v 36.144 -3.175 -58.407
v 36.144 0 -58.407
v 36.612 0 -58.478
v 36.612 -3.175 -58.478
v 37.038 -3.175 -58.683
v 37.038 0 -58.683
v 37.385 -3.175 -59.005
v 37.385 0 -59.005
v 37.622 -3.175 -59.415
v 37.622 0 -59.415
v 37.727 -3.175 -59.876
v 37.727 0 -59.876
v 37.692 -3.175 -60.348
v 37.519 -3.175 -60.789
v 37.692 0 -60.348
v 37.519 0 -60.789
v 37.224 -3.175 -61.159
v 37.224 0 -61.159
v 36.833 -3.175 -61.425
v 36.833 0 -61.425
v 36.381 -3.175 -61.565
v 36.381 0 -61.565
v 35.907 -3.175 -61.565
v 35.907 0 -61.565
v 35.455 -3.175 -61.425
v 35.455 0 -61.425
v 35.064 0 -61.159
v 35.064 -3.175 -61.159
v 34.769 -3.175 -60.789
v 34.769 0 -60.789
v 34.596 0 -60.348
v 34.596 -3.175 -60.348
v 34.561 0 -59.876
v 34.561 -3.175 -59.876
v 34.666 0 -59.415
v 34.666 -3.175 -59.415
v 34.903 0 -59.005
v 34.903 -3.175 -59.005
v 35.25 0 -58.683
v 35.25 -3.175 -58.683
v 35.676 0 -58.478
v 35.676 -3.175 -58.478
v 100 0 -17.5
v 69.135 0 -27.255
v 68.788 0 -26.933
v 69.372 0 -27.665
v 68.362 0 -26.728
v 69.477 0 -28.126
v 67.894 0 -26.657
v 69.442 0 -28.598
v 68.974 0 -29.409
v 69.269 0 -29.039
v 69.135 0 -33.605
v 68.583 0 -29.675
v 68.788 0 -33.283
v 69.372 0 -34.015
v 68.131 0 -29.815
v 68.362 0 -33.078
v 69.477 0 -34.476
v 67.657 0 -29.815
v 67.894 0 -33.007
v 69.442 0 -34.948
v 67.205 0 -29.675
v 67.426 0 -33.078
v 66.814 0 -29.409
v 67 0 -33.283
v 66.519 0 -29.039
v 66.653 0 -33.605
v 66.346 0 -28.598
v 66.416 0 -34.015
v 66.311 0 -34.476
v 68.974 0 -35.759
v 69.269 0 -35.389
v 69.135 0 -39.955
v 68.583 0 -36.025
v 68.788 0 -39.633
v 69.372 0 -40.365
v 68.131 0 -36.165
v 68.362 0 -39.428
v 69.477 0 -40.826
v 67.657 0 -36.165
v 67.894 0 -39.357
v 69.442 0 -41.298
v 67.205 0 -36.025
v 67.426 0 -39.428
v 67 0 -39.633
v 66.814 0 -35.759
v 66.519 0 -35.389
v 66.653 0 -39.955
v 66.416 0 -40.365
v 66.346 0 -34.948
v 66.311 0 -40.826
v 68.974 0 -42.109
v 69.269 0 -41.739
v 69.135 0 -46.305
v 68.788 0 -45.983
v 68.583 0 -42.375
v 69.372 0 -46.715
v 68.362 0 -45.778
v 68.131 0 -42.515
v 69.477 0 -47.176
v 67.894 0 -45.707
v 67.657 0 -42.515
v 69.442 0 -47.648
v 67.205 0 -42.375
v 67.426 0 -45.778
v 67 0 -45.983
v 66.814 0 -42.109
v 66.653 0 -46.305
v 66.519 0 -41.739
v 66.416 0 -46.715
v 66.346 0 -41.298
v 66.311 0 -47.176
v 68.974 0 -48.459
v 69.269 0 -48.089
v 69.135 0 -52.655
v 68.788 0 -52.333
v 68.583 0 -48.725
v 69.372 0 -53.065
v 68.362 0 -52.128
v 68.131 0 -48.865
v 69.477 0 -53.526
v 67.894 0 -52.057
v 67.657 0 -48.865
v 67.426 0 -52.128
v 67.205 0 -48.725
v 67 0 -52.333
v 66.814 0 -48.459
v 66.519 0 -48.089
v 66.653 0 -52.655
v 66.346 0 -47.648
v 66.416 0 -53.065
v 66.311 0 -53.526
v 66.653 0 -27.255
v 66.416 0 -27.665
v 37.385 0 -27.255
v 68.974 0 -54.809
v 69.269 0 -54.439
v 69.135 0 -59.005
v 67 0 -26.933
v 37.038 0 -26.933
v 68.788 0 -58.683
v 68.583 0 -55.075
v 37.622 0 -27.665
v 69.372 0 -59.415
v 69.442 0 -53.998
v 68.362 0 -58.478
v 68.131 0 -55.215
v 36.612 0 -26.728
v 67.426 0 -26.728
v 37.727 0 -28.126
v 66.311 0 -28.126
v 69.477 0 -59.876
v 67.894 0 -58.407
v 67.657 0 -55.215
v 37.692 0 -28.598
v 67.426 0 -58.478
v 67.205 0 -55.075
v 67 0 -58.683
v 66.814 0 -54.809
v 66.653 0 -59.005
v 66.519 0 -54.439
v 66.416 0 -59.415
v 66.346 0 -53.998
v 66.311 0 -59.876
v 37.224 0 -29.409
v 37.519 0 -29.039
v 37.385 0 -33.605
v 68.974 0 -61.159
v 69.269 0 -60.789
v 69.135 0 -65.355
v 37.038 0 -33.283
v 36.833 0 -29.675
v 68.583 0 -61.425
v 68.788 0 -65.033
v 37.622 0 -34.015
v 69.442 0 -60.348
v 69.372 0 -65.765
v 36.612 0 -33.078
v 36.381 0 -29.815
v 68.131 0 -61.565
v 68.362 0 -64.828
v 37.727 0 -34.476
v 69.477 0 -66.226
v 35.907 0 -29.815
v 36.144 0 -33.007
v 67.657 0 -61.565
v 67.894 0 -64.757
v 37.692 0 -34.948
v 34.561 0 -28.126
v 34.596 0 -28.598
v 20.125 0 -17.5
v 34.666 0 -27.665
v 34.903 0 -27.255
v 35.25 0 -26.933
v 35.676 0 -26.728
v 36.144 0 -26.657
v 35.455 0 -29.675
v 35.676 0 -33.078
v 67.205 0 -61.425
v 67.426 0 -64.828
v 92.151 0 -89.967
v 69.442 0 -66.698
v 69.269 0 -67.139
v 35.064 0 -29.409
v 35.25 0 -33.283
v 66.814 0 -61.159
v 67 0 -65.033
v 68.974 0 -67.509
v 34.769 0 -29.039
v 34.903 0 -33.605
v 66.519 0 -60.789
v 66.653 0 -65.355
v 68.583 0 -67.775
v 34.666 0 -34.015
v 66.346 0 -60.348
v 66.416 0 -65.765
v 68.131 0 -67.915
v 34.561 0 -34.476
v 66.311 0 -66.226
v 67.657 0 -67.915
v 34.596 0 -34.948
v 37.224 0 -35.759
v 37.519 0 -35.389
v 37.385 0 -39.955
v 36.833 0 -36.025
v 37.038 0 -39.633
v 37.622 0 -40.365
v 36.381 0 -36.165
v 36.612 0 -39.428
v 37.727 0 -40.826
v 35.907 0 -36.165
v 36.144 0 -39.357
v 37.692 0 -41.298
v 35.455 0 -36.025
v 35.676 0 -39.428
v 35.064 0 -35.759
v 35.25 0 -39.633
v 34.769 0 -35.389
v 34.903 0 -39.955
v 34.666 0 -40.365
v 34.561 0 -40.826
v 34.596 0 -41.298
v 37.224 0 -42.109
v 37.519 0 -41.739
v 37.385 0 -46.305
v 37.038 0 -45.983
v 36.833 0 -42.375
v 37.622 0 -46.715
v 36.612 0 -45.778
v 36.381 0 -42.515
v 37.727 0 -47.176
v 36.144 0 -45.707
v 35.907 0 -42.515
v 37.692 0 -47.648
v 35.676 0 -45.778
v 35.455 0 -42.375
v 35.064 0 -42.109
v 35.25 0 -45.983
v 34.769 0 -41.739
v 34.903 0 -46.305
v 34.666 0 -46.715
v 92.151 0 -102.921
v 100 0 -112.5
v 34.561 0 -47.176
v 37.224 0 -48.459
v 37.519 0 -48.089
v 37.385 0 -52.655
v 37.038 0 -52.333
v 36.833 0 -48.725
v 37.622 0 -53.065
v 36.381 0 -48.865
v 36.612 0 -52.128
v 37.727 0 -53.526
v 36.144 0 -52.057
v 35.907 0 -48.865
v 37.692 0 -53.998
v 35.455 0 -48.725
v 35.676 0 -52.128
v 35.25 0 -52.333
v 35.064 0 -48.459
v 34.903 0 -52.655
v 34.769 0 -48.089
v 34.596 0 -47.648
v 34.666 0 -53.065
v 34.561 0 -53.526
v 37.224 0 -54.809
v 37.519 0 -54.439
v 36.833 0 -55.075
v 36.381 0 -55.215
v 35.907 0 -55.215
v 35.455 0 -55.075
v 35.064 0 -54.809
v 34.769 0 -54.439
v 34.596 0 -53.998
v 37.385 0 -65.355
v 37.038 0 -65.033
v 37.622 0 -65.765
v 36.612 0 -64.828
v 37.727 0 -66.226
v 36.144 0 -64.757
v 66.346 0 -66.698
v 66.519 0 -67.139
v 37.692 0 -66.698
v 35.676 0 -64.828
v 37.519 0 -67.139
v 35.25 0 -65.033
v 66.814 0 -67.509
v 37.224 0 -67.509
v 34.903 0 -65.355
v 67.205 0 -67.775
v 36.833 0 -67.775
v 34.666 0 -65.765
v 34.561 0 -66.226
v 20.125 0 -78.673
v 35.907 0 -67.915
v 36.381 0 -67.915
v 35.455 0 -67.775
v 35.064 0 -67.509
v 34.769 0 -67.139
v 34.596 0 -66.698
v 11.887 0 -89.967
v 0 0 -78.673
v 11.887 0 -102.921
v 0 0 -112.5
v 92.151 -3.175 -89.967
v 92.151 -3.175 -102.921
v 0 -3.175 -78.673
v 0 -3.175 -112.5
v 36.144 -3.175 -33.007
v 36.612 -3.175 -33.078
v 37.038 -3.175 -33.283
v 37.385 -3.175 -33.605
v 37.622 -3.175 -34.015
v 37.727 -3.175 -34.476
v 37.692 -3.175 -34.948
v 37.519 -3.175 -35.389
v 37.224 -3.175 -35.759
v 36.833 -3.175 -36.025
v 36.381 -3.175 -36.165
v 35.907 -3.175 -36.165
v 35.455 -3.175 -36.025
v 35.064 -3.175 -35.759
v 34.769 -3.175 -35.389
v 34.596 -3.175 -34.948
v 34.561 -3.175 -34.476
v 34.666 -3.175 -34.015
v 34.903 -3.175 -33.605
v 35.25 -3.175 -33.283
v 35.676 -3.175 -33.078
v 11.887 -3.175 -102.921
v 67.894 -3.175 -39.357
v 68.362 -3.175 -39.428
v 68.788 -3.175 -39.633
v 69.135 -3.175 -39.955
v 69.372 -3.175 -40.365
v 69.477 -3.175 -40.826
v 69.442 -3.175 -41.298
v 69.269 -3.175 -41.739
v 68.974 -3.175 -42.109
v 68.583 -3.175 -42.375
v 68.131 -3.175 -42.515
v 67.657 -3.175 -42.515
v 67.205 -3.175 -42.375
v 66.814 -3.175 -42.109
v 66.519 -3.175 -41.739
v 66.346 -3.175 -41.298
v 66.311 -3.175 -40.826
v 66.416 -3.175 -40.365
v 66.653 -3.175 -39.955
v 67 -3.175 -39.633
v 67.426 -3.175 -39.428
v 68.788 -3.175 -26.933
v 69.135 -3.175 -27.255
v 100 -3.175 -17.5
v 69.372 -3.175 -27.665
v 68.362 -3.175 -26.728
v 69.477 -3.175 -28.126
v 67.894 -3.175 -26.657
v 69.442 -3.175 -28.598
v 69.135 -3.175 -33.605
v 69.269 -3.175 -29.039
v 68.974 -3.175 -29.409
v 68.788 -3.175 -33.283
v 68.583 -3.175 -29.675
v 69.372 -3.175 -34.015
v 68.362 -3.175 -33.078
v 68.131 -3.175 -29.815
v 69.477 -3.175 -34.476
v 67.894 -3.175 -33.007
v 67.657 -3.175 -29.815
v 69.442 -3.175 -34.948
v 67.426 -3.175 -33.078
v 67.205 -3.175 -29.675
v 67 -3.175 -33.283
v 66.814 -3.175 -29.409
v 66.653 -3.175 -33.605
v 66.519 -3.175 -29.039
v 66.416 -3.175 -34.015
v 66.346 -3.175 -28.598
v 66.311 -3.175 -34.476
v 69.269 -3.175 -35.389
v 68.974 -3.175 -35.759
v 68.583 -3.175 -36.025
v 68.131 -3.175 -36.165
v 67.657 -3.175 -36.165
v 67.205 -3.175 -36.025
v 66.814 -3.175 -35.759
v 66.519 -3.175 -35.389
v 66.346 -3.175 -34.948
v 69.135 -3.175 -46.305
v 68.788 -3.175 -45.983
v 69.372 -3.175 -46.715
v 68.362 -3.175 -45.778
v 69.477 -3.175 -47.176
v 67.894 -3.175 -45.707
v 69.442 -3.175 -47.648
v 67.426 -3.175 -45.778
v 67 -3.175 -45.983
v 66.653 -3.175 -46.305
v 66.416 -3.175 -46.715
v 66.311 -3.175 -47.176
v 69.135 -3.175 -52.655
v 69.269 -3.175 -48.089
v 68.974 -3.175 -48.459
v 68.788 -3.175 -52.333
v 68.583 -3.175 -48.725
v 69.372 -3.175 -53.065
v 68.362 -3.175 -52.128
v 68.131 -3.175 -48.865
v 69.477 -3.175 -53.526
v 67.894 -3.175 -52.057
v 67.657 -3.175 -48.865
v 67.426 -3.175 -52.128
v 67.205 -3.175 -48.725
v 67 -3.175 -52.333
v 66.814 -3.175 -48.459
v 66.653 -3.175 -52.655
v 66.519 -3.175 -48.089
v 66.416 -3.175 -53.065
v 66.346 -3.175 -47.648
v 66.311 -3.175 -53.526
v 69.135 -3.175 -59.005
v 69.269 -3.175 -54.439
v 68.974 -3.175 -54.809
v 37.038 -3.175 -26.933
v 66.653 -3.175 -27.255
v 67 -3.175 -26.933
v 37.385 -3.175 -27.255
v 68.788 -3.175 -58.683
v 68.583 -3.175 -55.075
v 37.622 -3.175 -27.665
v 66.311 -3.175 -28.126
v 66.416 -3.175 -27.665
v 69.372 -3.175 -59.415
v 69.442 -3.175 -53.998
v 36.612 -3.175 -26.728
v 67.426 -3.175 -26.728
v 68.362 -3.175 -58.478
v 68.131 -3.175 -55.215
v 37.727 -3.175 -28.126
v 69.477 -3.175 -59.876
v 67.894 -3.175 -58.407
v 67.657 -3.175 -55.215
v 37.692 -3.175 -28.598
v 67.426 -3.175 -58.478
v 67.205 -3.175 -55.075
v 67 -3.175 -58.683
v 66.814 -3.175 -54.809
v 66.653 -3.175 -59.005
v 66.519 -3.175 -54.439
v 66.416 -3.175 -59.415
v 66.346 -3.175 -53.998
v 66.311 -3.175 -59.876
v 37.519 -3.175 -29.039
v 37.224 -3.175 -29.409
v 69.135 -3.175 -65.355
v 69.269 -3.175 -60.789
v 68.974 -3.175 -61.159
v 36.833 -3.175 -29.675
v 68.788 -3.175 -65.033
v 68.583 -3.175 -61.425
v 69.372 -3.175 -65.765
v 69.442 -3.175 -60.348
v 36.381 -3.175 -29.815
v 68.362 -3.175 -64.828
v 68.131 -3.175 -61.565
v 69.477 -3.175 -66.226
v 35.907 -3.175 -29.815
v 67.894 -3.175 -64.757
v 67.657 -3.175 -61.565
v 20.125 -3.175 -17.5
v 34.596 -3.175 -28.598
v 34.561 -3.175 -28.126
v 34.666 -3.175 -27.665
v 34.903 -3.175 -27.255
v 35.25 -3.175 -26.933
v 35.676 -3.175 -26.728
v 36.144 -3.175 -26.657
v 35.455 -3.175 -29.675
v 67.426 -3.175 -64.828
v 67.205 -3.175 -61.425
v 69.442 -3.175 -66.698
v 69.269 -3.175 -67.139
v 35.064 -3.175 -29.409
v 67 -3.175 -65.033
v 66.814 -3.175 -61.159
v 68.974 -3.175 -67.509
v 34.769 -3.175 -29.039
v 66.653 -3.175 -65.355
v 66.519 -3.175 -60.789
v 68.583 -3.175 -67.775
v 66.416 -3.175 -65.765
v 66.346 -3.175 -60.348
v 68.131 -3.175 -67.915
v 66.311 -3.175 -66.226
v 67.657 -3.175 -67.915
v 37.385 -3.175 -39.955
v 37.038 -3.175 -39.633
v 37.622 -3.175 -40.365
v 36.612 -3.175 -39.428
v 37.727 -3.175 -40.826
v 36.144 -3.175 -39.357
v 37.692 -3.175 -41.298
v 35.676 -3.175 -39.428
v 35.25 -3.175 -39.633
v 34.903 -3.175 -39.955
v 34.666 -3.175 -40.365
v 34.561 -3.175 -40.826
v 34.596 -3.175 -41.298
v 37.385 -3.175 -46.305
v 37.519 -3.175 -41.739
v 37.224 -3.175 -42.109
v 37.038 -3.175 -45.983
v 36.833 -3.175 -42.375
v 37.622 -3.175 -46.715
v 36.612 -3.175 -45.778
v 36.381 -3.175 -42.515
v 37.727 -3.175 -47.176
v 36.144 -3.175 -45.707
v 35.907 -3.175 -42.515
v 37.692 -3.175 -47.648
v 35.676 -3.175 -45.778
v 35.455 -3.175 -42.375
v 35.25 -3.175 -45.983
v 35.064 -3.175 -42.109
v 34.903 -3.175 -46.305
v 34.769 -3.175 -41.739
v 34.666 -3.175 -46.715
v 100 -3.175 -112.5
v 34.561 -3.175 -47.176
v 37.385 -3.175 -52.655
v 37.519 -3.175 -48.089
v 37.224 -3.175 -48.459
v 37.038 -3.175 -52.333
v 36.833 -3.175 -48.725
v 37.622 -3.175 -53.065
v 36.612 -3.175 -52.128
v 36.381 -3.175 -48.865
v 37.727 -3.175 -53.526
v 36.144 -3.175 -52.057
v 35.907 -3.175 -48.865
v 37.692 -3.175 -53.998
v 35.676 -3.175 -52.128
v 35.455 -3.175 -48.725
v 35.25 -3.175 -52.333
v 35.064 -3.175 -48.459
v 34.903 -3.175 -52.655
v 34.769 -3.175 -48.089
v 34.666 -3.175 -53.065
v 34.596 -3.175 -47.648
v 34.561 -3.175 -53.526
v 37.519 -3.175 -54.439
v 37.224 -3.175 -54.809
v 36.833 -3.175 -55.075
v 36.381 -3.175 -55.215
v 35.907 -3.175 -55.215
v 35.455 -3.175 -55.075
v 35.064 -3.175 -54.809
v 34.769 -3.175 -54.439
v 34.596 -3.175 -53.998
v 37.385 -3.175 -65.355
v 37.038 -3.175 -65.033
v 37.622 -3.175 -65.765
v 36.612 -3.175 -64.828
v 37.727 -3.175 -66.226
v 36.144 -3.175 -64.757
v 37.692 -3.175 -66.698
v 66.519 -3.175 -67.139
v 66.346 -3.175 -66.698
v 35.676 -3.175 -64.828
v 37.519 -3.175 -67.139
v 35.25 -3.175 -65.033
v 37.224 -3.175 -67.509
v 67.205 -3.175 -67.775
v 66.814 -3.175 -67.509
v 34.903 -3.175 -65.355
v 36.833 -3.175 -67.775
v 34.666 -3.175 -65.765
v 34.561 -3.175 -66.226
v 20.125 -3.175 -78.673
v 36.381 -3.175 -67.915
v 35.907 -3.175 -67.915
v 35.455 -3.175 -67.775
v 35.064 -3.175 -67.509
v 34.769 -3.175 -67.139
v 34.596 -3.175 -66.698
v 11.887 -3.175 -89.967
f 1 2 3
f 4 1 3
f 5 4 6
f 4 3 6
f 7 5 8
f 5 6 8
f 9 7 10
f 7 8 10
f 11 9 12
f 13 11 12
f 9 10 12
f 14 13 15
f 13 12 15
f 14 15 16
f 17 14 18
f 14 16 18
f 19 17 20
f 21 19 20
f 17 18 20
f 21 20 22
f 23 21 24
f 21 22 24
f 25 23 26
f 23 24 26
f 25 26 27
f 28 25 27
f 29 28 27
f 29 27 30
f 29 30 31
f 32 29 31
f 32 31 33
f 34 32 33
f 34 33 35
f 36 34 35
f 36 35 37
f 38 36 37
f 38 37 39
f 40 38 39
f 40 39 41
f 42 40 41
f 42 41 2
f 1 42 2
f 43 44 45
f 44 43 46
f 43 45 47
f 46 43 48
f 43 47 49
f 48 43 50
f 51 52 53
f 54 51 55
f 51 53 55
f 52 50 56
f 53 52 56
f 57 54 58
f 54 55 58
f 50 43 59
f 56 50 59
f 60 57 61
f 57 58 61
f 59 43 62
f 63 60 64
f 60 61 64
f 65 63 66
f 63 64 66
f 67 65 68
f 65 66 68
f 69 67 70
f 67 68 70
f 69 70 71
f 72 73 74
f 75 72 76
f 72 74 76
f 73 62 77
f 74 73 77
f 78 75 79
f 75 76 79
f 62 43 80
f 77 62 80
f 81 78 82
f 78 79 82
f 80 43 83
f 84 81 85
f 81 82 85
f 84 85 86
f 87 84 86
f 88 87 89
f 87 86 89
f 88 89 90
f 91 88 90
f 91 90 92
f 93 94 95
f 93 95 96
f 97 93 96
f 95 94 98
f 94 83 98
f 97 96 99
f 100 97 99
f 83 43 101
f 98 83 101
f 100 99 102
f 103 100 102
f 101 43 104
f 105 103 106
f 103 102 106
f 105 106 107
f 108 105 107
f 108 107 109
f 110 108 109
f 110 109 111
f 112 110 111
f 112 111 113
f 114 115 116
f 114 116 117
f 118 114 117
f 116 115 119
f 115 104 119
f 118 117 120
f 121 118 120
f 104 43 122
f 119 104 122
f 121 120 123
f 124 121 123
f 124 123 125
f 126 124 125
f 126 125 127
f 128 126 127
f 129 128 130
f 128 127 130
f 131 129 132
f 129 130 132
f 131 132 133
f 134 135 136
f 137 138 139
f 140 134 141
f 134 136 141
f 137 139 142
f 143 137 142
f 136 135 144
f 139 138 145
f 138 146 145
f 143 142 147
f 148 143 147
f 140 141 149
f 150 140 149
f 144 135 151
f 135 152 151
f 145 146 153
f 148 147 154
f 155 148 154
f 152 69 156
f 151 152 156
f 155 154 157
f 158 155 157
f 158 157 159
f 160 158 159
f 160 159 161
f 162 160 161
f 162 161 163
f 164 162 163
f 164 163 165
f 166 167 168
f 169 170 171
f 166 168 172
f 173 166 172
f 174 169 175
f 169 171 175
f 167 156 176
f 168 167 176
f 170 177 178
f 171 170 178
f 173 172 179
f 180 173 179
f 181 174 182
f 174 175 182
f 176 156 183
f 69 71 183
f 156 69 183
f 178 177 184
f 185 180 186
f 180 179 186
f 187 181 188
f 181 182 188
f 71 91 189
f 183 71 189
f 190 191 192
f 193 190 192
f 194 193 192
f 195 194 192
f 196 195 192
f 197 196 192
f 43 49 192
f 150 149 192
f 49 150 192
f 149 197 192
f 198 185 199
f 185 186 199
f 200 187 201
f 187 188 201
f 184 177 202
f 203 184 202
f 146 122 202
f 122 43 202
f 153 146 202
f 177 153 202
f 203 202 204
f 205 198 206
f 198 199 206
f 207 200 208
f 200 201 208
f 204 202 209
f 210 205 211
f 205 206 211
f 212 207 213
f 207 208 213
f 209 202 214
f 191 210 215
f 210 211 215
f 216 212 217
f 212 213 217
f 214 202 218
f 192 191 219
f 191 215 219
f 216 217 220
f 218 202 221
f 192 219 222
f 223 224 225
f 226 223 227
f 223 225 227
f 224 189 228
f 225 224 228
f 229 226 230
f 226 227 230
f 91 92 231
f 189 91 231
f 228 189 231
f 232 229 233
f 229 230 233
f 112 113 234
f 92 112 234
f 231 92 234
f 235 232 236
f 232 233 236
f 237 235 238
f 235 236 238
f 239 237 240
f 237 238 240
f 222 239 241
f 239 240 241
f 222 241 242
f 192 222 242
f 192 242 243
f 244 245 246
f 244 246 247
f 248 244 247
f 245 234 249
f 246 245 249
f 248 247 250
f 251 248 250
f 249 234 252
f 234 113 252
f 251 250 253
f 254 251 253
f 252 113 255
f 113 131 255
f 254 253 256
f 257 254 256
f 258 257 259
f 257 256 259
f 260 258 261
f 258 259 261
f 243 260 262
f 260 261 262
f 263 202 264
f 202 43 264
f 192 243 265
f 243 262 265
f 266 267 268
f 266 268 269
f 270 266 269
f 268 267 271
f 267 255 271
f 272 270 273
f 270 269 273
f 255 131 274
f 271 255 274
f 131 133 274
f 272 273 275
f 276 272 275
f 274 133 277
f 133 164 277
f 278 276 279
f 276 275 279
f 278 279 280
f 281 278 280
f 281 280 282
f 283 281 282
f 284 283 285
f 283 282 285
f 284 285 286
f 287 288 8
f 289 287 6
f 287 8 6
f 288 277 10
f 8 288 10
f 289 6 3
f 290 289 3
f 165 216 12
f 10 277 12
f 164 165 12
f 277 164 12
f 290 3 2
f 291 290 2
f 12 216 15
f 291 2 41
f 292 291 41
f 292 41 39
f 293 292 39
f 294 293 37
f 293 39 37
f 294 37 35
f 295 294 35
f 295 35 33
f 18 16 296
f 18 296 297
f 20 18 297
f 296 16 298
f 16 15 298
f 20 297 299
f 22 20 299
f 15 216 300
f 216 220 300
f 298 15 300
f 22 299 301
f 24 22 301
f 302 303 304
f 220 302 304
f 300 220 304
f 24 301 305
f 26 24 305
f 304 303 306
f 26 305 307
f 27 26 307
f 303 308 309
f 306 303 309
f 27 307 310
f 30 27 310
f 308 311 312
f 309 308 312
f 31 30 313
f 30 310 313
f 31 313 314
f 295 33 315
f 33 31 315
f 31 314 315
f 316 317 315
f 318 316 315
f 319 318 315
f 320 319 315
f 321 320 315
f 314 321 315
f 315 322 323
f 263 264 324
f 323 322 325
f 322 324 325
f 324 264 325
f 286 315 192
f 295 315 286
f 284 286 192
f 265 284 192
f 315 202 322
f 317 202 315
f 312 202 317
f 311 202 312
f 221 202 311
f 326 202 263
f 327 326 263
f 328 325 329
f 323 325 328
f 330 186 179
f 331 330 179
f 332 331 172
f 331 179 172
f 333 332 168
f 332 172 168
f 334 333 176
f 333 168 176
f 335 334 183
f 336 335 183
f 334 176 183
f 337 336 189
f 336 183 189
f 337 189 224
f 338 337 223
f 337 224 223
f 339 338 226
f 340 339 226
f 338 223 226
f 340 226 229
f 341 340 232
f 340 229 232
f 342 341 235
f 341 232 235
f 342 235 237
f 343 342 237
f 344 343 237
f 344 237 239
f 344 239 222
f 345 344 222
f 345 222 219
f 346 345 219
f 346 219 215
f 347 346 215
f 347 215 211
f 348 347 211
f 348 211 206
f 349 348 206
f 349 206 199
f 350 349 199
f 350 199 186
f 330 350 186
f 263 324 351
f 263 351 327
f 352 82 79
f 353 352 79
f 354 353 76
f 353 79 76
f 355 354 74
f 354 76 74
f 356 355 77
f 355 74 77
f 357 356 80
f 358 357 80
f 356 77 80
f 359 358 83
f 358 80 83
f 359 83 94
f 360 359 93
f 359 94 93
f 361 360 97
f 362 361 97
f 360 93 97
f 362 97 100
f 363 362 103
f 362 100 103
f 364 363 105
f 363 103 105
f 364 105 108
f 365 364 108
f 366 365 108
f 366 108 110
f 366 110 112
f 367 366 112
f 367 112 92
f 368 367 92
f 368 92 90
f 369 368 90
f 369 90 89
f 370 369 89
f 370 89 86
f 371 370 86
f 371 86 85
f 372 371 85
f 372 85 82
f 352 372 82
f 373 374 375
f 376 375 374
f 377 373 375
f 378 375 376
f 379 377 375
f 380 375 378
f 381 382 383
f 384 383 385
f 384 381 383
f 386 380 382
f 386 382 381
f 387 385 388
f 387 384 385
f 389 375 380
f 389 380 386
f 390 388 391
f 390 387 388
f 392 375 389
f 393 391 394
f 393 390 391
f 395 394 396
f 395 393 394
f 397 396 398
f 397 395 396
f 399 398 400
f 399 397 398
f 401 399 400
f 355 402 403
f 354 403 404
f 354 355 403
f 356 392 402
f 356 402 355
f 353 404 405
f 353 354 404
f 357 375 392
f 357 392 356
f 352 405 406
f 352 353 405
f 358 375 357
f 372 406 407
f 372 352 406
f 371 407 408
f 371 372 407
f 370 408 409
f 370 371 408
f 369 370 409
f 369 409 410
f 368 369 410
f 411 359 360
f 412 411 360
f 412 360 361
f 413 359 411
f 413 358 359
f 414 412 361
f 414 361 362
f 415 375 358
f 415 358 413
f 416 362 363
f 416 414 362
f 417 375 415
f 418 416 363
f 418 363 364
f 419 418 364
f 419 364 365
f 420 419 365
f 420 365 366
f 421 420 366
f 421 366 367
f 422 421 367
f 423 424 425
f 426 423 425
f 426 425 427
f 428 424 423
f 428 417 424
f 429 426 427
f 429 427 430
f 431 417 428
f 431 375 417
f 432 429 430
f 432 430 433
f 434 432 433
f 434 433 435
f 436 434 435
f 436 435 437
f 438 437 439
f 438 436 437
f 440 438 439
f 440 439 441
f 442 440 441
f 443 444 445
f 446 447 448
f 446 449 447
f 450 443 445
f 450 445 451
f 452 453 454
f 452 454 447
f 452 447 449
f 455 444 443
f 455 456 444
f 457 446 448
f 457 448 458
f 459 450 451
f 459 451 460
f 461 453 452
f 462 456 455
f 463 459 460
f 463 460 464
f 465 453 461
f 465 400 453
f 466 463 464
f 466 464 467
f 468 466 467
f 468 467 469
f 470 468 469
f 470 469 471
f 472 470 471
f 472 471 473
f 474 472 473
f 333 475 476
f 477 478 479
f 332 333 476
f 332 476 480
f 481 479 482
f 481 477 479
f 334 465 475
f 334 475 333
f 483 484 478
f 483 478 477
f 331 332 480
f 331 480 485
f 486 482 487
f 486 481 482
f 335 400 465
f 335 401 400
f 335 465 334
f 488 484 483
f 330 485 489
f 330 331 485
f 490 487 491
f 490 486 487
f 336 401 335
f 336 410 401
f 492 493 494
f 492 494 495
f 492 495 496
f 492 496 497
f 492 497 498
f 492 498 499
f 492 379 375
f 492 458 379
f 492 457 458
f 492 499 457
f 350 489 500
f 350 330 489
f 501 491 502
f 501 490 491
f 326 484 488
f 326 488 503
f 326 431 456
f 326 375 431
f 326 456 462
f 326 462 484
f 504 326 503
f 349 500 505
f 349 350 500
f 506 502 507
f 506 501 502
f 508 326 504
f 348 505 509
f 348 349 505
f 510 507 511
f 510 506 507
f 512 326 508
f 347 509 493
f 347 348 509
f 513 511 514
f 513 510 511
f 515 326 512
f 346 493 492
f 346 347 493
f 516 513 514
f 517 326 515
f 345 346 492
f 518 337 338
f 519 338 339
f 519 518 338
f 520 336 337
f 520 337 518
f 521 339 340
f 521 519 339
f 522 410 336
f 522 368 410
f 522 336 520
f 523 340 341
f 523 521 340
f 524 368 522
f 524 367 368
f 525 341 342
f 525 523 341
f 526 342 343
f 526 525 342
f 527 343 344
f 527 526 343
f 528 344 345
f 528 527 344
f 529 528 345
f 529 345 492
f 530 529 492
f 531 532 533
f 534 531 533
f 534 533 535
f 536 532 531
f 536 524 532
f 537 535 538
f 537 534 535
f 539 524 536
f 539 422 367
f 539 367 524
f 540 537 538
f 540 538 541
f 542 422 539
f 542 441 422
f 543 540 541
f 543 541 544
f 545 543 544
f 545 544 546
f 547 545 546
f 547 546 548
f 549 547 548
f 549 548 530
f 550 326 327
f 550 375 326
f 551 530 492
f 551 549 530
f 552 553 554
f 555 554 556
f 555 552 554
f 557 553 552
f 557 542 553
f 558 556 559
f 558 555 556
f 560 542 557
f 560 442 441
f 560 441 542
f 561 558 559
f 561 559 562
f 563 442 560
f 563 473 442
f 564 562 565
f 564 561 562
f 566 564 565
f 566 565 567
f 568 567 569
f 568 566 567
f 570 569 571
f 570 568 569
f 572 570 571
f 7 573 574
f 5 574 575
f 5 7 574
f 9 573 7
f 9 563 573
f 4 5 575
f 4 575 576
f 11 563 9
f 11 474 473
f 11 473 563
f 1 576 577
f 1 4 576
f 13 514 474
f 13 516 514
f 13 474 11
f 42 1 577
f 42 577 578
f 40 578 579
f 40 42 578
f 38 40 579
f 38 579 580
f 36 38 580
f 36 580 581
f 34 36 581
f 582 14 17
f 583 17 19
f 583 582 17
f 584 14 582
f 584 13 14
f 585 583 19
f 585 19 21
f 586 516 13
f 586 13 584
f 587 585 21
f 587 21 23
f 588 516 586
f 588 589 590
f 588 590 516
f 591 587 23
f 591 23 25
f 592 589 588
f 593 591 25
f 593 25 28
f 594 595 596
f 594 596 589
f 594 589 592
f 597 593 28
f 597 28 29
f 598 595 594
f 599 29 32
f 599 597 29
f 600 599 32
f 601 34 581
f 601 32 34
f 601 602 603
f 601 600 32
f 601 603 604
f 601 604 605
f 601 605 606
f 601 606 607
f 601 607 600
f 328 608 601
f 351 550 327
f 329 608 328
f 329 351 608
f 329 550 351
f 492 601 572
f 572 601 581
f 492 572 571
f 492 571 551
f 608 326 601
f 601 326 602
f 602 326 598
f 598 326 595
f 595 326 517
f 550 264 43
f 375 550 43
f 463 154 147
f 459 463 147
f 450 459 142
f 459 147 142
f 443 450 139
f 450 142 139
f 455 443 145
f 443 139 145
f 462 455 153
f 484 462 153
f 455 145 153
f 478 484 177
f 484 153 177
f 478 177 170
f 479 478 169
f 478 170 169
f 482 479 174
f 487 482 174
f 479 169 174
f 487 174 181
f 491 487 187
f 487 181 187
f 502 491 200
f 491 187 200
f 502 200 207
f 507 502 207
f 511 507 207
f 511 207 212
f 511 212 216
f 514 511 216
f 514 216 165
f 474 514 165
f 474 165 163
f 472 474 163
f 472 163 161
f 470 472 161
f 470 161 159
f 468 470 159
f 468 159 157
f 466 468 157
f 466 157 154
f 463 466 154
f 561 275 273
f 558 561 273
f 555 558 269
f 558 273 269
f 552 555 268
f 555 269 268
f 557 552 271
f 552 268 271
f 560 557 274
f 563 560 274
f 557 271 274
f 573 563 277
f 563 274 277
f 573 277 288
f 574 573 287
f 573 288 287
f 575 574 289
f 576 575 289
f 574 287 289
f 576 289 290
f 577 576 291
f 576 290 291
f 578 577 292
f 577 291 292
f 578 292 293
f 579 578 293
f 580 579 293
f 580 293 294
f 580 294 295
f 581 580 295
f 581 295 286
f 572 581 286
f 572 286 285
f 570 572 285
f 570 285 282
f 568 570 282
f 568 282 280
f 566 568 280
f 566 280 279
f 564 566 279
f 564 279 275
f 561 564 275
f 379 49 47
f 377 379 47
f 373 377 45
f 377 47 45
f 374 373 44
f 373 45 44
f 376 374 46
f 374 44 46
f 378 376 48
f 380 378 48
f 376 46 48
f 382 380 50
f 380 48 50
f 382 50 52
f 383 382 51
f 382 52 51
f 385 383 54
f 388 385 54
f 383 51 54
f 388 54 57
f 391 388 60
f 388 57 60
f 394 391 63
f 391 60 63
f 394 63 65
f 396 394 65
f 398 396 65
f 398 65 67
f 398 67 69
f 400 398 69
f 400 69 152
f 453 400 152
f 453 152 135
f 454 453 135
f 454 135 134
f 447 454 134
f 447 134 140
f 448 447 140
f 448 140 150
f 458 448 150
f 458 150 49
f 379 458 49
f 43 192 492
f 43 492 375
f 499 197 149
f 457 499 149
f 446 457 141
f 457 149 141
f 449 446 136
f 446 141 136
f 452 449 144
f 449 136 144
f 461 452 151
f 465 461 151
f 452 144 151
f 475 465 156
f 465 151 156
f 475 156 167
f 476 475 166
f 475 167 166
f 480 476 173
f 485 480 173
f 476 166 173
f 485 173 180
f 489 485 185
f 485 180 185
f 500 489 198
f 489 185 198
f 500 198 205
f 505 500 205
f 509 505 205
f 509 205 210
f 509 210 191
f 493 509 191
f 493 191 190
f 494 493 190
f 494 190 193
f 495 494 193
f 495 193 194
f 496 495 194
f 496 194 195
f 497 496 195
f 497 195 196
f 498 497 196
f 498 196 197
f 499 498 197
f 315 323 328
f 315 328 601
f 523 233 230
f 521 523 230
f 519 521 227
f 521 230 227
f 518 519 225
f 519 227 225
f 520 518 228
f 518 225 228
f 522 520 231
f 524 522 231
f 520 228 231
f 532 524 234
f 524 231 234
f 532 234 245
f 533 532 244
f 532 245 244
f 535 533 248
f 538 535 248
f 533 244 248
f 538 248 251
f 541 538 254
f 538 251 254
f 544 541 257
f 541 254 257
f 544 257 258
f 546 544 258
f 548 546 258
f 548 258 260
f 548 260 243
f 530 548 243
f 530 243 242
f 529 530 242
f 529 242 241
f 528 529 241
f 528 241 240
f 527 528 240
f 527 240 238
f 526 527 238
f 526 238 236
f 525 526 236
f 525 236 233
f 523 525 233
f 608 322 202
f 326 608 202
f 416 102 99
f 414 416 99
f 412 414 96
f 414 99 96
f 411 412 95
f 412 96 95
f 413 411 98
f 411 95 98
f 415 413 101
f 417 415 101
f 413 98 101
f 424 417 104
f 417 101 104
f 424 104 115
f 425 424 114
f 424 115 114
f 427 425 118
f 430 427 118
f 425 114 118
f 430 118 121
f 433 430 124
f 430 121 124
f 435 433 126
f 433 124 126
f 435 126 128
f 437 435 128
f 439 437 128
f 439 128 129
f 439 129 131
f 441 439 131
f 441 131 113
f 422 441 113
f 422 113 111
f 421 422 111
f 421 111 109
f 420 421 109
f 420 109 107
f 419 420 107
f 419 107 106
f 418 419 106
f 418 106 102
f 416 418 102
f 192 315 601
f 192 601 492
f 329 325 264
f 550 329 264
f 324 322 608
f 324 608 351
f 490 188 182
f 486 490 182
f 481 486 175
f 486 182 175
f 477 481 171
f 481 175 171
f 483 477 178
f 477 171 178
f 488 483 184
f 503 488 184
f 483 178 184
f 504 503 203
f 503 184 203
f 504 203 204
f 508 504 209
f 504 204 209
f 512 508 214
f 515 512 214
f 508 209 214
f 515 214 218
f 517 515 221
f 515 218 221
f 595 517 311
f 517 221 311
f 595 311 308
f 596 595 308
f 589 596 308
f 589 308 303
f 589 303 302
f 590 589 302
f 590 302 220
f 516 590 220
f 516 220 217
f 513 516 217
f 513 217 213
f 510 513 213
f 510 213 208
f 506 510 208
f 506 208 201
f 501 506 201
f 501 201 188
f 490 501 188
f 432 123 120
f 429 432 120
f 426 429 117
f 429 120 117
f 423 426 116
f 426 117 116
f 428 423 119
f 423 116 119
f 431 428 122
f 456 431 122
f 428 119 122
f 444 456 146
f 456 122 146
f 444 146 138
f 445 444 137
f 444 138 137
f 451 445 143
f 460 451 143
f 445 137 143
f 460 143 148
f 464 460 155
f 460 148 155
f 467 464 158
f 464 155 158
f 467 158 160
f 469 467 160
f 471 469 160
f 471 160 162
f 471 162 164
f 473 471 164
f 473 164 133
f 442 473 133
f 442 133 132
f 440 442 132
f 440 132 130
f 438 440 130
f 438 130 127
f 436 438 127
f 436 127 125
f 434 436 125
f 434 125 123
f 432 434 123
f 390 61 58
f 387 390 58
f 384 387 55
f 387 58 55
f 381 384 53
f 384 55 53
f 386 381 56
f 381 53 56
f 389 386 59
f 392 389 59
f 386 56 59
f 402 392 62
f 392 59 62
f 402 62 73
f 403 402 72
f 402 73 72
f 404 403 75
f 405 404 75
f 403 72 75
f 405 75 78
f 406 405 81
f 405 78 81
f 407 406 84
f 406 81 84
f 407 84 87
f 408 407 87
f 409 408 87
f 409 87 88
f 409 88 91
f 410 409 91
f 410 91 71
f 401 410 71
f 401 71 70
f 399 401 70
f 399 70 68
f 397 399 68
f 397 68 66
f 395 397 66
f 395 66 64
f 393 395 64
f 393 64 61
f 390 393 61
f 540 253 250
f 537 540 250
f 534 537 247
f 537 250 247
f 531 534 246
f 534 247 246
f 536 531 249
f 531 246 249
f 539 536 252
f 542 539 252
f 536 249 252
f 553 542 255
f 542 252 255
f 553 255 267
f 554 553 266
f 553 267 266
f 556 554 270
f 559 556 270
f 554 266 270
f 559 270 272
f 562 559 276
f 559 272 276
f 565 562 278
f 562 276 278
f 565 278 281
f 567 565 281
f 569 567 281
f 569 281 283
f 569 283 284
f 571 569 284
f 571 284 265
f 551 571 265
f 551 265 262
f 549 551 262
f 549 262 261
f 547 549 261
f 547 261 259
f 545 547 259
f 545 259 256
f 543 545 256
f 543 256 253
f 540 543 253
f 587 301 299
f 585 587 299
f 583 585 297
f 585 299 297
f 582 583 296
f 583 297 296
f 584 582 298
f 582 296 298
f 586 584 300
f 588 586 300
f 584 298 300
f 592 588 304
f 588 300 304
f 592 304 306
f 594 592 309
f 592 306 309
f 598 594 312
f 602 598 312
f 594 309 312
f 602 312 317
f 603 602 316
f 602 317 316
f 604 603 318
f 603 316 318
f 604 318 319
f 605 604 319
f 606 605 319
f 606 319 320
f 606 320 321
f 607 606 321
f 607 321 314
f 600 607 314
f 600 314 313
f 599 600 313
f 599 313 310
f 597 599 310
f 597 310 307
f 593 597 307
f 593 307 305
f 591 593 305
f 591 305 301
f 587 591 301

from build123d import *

# Parameters (mm, degrees)
BOSS_EXTRUDE1_DEPTH = 3.175
SKETCH2_R           = 1.5875
SKETCH2_W           = 80.264
SKETCH2_H           = 12.954
CUT_EXTRUDE1_DEPTH  = 223.985606318
SKETCH7_R           = 2.032
SKETCH7_R_2         = 1.651
SKETCH7_W           = 47.244
SKETCH7_H           = 139.192
CUT_EXTRUDE4_DEPTH  = 223.985606318
SKETCH8_R           = 1.651
CUT_EXTRUDE5_DEPTH  = 223.985606318
SKETCH9_R           = 1.778
CUT_EXTRUDE6_DEPTH  = 221.482742149
CUT_EXTRUDE7_DEPTH  = 221.482742149


with BuildPart() as part:
    # Sketch1 → Boss-Extrude1 (new body)
    with BuildSketch(Plane(origin=(0, 0, 0), x_dir=(1, 0, 0), z_dir=(0, 1, 0))):
        with BuildLine():
            Line((-80, 112.5), (100, 112.5))
            Line((100, 112.5), (100, -112.5))
            Line((100, -112.5), (-80, -112.5))
            ThreePointArc((-80, -112.5), (-192.5, 0), (-80, 112.5))
        make_face()
    extrude(amount=-BOSS_EXTRUDE1_DEPTH)

    # Sketch2 → Cut-Extrude1 (cut, through all)
    with BuildSketch(Plane(origin=(0, 0, 0), x_dir=(1, 0, 0), z_dir=(0, 1, 0))):
        with Locations(Location((36.144045702, -66.3448, 0), (0, 0, 270))):
            Circle(SKETCH2_R)
        with Locations(Location((36.144045702, -59.9948, 0), (0, 0, 270))):
            Circle(SKETCH2_R)
        with Locations(Location((36.144045702, -53.6448, 0), (0, 0, 270))):
            Circle(SKETCH2_R)
        with Locations(Location((36.144045702, -47.2948, 0), (0, 0, 270))):
            Circle(SKETCH2_R)
        with Locations(Location((36.144045702, -40.9448, 0), (0, 0, 270))):
            Circle(SKETCH2_R)
        with Locations(Location((36.144045702, -34.5948, 0), (0, 0, 270))):
            Circle(SKETCH2_R)
        with Locations(Location((36.144045702, -28.2448, 0), (0, 0, 270))):
            Circle(SKETCH2_R)
        with Locations(Location((67.894045702, -66.3448, 0), (0, 0, 270))):
            Circle(SKETCH2_R)
        with Locations(Location((67.894045702, -59.9948, 0), (0, 0, 270))):
            Circle(SKETCH2_R)
        with Locations(Location((67.894045702, -53.6448, 0), (0, 0, 270))):
            Circle(SKETCH2_R)
        with Locations(Location((67.894045702, -47.2948, 0), (0, 0, 270))):
            Circle(SKETCH2_R)
        with Locations(Location((67.894045702, -40.9448, 0), (0, 0, 270))):
            Circle(SKETCH2_R)
        with Locations(Location((67.894045702, -34.5948, 0), (0, 0, 270))):
            Circle(SKETCH2_R)
        with Locations(Location((67.894045702, -28.2448, 0), (0, 0, 270))):
            Circle(SKETCH2_R)
        with Locations(Location((36.144045702, 66.3448, 0), (0, 0, 270))):
            Circle(SKETCH2_R)
        with Locations(Location((36.144045702, 59.9948, 0), (0, 0, 270))):
            Circle(SKETCH2_R)
        with Locations(Location((36.144045702, 53.6448, 0), (0, 0, 270))):
            Circle(SKETCH2_R)
        with Locations(Location((36.144045702, 47.2948, 0), (0, 0, 270))):
            Circle(SKETCH2_R)
        with Locations(Location((36.144045702, 40.9448, 0), (0, 0, 270))):
            Circle(SKETCH2_R)
        with Locations(Location((36.144045702, 34.5948, 0), (0, 0, 270))):
            Circle(SKETCH2_R)
        with Locations(Location((36.144045702, 28.2448, 0), (0, 0, 270))):
            Circle(SKETCH2_R)
        with Locations(Location((67.894045702, 66.3448, 0), (0, 0, 270))):
            Circle(SKETCH2_R)
        with Locations(Location((67.894045702, 59.9948, 0), (0, 0, 270))):
            Circle(SKETCH2_R)
        with Locations(Location((67.894045702, 53.6448, 0), (0, 0, 270))):
            Circle(SKETCH2_R)
        with Locations(Location((67.894045702, 47.2948, 0), (0, 0, 270))):
            Circle(SKETCH2_R)
        with Locations(Location((67.894045702, 40.9448, 0), (0, 0, 270))):
            Circle(SKETCH2_R)
        with Locations(Location((67.894045702, 34.5948, 0), (0, 0, 270))):
            Circle(SKETCH2_R)
        with Locations(Location((67.894045702, 28.2448, 0), (0, 0, 270))):
            Circle(SKETCH2_R)
        with Locations((52.019045702, -96.4438)):
            Rectangle(SKETCH2_W, SKETCH2_H)
        with Locations((52.019045702, 96.4438)):
            Rectangle(SKETCH2_W, SKETCH2_H)
    extrude(amount=-CUT_EXTRUDE1_DEPTH, mode=Mode.SUBTRACT)

    # Sketch7 → Cut-Extrude4 (cut, through all)
    with BuildSketch(Plane(origin=(0, 0, 0), x_dir=(1, 0, 0), z_dir=(0, 1, 0))):
        with Locations(Location((-50.421540267, 0, 0), (0, 0, 270))):
            Circle(SKETCH7_R)
        with Locations(Location((25.778459733, 0, 0), (0, 0, 270))):
            Circle(SKETCH7_R_2)
        with Locations(Location((86.738459733, 0, 0), (0, 0, 270))):
            Circle(SKETCH7_R_2)
        with Locations(Location((-50.421540267, 40.64, 0), (0, 0, 270))):
            Circle(SKETCH7_R_2)
        with Locations(Location((-50.421540267, -40.64, 0), (0, 0, 270))):
            Circle(SKETCH7_R_2)
        with Locations(Location((15.872459733, -40.64, 0), (0, 0, 270))):
            Circle(SKETCH7_R)
        with Locations(Location((15.872459733, 40.64, 0), (0, 0, 270))):
            Circle(SKETCH7_R)
        with Locations((-14.099540267, 0)):
            Rectangle(SKETCH7_W, SKETCH7_H)
    extrude(amount=-CUT_EXTRUDE4_DEPTH, mode=Mode.SUBTRACT)

    # Sketch8 → Cut-Extrude5 (cut, through all)
    with BuildSketch(Plane(origin=(0, 0, 0), x_dir=(1, 0, 0), z_dir=(0, 1, 0))):
        with Locations(Location((-177.3836, 33.02, 0), (0, 0, 270))):
            Circle(SKETCH8_R)
        with Locations(Location((-177.3836, -33.02, 0), (0, 0, 270))):
            Circle(SKETCH8_R)
        with Locations(Location((-151.9836, 33.02, 0), (0, 0, 270))):
            Circle(SKETCH8_R)
        with Locations(Location((-151.9836, -33.02, 0), (0, 0, 270))):
            Circle(SKETCH8_R)
        with BuildLine():
            Line((-167.0966, 25.4), (-229.776686608, 25.4))
            Line((-229.776686608, 25.4), (-229.776686608, -25.4))
            Line((-229.776686608, -25.4), (-167.0966, -25.4))
            ThreePointArc((-167.0966, -25.4), (-141.6966, 0), (-167.0966, 25.4))
        make_face()
    extrude(amount=-CUT_EXTRUDE5_DEPTH, mode=Mode.SUBTRACT)

    # Sketch9 → Cut-Extrude6 (cut, through all)
    with BuildSketch(Plane(origin=(0, 0, 0), x_dir=(1, 0, 0), z_dir=(0, 1, 0))):
        with Locations(Location((-161.795319669, -55.88, 0), (0, 0, 270))):
            Circle(SKETCH9_R)
        with Locations(Location((-124.964619687, -86.784626771, 0), (0, 0, 270))):
            Circle(SKETCH9_R)
        with Locations(Location((-161.795319669, 55.88, 0), (0, 0, 270))):
            Circle(SKETCH9_R)
        with Locations(Location((-124.964619687, 86.784626771, 0), (0, 0, 270))):
            Circle(SKETCH9_R)
    extrude(amount=-CUT_EXTRUDE6_DEPTH, mode=Mode.SUBTRACT)

    # Sketch10 → Cut-Extrude7 (cut, through all)
    with BuildSketch(Plane(origin=(0, 0, 0), x_dir=(1, 0, 0), z_dir=(0, 1, 0))):
        Polygon((0, 127.979520785), (0, 78.672810993), (20.125086798, 78.672810993), (20.125086798, 17.499658407), (114.992352539, 17.499658407), (114.992352539, -151.143860627), (-214.259658065, -151.143860627), (-214.259658065, 127.979520785), align=None)
    extrude(amount=-CUT_EXTRUDE7_DEPTH, mode=Mode.SUBTRACT)


solid = part.part
